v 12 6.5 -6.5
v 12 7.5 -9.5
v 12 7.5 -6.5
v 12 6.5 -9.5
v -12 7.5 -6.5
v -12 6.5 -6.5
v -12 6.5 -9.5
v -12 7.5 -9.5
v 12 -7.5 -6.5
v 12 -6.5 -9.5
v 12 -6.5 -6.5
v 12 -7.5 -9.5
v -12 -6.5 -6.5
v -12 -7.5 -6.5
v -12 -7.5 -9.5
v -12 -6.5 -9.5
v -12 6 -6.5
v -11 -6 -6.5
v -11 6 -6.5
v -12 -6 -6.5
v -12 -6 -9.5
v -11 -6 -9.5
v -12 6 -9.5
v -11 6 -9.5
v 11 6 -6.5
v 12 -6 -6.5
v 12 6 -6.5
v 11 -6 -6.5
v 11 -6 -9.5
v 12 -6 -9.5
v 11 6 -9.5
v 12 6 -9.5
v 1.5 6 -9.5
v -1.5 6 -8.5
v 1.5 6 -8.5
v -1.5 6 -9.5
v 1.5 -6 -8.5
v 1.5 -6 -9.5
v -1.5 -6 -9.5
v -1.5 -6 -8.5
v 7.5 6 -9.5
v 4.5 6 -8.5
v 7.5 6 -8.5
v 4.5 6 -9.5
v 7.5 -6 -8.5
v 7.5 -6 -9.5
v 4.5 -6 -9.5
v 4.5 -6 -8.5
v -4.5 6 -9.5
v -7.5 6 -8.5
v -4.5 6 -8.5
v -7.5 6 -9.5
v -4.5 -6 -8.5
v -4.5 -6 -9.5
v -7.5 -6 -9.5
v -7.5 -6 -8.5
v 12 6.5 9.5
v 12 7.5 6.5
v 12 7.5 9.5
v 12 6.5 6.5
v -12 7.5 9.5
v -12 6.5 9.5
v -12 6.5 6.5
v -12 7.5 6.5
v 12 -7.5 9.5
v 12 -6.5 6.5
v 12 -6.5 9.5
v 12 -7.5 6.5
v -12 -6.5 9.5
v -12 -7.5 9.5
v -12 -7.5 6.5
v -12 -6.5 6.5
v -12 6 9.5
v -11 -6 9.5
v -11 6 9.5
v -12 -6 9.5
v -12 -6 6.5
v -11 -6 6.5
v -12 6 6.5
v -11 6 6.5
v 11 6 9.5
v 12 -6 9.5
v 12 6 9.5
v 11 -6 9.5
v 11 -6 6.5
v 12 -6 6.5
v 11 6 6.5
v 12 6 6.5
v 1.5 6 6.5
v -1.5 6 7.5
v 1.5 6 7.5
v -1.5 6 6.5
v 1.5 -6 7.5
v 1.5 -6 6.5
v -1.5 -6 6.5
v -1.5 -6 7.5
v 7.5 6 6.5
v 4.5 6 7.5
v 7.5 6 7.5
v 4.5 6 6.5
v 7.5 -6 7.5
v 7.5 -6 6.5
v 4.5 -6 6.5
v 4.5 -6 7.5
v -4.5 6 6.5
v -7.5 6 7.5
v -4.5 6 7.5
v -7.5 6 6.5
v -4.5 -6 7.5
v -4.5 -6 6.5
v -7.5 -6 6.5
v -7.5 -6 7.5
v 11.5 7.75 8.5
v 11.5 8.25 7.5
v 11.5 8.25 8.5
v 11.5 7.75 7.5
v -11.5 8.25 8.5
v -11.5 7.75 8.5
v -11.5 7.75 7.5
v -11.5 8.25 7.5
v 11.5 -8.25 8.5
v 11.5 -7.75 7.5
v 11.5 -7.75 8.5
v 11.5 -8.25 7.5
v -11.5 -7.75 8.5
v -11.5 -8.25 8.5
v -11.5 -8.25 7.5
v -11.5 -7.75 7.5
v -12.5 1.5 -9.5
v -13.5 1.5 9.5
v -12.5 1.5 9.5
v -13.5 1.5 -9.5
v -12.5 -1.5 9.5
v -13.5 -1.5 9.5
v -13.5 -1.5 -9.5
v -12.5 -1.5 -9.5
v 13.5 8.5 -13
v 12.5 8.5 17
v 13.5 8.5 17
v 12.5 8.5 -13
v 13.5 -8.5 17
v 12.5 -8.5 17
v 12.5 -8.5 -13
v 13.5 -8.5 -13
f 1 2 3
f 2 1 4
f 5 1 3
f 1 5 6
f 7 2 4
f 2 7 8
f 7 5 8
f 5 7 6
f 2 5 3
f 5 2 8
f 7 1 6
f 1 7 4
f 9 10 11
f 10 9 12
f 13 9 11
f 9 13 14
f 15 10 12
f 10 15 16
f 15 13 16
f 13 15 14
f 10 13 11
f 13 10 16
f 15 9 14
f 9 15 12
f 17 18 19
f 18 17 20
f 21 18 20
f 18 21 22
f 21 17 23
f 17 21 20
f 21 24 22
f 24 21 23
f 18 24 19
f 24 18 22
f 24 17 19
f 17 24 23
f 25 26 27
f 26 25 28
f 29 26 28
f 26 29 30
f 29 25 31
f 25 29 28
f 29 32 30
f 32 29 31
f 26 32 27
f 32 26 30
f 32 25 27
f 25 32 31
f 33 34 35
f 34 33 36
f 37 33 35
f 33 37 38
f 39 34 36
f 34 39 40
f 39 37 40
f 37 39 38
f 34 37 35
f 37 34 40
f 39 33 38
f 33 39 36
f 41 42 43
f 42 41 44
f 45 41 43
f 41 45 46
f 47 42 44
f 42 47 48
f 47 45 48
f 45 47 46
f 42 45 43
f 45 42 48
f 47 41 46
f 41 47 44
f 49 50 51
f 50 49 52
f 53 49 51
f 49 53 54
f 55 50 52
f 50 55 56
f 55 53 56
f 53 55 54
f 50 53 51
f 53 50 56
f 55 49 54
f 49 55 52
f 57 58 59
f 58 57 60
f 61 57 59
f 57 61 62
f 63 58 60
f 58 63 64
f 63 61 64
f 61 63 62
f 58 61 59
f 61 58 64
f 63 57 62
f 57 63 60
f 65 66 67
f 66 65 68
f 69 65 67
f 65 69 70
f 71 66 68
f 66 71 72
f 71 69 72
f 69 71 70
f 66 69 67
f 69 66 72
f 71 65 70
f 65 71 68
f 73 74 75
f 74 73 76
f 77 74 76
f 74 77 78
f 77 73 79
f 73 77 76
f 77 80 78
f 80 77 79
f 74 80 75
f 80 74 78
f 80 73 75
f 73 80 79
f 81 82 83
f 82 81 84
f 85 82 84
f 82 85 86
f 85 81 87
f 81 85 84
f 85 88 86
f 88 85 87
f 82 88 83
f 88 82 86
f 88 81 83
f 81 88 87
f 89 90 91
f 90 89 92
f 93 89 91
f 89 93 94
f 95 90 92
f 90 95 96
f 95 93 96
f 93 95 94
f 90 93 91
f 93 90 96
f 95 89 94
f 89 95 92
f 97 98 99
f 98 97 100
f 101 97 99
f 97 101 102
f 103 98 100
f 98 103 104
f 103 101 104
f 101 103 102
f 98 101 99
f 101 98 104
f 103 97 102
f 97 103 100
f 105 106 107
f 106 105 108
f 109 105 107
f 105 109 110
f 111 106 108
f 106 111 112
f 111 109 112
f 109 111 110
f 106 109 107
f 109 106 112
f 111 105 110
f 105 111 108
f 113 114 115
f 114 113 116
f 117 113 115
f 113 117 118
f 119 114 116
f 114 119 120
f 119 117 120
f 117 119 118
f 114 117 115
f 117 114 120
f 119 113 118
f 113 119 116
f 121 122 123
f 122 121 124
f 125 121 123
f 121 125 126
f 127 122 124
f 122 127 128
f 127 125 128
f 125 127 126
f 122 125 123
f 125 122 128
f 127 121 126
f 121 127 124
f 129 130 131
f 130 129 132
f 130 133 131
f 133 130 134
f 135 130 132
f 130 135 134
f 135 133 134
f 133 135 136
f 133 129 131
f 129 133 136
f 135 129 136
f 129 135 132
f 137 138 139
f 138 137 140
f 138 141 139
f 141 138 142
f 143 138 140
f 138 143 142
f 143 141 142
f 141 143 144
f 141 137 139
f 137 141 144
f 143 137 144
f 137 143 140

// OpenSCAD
module drawer(rail) {
  color([1.0, 1.0, 0.75]) {
    translate([0, 7, 0]) cube([24, 1, 3], center = true);
    translate([0, -7, 0]) cube([24, 1, 3], center = true);
    rotate([0,0,90]) translate([0, 11.5, 0]) cube([12 , 1, 3], center = true);
    rotate([0,0,90]) translate([0, -11.5, 0]) cube([12, 1, 3], center = true);

    rotate([90,0 ,90]) translate([0, -1, 0]) cube([12, 1, 3], center = true);
    rotate([90,0 ,90]) translate([0, -1, 6]) cube([12, 1, 3], center = true);
    rotate([90,0 ,90]) translate([0, -1, -6]) cube([12, 1, 3], center = true);
  }

  if (rail) {
    color([0.6, 0.6, 0.7]) {
      translate([0, 8, 0]) cube([23, 0.5, 1], center = true);
      translate([0, -8, 0]) cube([23, 0.5, 1], center = true);
    }
  }
}

translate([0,0,-8]) drawer(false);
translate([0,0,8]) drawer(true);

// tie
color([1.0,1.0,0.75])
rotate([0,90,90]) translate([0, 13, 0]) cube([19, 1, 3], center = true);

  // front
color([0.25, 0.5, 0.25]) {
  rotate([0,90,90])
    translate([-2, -13, 0])
      cube([30, 1, 17], center = true);
}
